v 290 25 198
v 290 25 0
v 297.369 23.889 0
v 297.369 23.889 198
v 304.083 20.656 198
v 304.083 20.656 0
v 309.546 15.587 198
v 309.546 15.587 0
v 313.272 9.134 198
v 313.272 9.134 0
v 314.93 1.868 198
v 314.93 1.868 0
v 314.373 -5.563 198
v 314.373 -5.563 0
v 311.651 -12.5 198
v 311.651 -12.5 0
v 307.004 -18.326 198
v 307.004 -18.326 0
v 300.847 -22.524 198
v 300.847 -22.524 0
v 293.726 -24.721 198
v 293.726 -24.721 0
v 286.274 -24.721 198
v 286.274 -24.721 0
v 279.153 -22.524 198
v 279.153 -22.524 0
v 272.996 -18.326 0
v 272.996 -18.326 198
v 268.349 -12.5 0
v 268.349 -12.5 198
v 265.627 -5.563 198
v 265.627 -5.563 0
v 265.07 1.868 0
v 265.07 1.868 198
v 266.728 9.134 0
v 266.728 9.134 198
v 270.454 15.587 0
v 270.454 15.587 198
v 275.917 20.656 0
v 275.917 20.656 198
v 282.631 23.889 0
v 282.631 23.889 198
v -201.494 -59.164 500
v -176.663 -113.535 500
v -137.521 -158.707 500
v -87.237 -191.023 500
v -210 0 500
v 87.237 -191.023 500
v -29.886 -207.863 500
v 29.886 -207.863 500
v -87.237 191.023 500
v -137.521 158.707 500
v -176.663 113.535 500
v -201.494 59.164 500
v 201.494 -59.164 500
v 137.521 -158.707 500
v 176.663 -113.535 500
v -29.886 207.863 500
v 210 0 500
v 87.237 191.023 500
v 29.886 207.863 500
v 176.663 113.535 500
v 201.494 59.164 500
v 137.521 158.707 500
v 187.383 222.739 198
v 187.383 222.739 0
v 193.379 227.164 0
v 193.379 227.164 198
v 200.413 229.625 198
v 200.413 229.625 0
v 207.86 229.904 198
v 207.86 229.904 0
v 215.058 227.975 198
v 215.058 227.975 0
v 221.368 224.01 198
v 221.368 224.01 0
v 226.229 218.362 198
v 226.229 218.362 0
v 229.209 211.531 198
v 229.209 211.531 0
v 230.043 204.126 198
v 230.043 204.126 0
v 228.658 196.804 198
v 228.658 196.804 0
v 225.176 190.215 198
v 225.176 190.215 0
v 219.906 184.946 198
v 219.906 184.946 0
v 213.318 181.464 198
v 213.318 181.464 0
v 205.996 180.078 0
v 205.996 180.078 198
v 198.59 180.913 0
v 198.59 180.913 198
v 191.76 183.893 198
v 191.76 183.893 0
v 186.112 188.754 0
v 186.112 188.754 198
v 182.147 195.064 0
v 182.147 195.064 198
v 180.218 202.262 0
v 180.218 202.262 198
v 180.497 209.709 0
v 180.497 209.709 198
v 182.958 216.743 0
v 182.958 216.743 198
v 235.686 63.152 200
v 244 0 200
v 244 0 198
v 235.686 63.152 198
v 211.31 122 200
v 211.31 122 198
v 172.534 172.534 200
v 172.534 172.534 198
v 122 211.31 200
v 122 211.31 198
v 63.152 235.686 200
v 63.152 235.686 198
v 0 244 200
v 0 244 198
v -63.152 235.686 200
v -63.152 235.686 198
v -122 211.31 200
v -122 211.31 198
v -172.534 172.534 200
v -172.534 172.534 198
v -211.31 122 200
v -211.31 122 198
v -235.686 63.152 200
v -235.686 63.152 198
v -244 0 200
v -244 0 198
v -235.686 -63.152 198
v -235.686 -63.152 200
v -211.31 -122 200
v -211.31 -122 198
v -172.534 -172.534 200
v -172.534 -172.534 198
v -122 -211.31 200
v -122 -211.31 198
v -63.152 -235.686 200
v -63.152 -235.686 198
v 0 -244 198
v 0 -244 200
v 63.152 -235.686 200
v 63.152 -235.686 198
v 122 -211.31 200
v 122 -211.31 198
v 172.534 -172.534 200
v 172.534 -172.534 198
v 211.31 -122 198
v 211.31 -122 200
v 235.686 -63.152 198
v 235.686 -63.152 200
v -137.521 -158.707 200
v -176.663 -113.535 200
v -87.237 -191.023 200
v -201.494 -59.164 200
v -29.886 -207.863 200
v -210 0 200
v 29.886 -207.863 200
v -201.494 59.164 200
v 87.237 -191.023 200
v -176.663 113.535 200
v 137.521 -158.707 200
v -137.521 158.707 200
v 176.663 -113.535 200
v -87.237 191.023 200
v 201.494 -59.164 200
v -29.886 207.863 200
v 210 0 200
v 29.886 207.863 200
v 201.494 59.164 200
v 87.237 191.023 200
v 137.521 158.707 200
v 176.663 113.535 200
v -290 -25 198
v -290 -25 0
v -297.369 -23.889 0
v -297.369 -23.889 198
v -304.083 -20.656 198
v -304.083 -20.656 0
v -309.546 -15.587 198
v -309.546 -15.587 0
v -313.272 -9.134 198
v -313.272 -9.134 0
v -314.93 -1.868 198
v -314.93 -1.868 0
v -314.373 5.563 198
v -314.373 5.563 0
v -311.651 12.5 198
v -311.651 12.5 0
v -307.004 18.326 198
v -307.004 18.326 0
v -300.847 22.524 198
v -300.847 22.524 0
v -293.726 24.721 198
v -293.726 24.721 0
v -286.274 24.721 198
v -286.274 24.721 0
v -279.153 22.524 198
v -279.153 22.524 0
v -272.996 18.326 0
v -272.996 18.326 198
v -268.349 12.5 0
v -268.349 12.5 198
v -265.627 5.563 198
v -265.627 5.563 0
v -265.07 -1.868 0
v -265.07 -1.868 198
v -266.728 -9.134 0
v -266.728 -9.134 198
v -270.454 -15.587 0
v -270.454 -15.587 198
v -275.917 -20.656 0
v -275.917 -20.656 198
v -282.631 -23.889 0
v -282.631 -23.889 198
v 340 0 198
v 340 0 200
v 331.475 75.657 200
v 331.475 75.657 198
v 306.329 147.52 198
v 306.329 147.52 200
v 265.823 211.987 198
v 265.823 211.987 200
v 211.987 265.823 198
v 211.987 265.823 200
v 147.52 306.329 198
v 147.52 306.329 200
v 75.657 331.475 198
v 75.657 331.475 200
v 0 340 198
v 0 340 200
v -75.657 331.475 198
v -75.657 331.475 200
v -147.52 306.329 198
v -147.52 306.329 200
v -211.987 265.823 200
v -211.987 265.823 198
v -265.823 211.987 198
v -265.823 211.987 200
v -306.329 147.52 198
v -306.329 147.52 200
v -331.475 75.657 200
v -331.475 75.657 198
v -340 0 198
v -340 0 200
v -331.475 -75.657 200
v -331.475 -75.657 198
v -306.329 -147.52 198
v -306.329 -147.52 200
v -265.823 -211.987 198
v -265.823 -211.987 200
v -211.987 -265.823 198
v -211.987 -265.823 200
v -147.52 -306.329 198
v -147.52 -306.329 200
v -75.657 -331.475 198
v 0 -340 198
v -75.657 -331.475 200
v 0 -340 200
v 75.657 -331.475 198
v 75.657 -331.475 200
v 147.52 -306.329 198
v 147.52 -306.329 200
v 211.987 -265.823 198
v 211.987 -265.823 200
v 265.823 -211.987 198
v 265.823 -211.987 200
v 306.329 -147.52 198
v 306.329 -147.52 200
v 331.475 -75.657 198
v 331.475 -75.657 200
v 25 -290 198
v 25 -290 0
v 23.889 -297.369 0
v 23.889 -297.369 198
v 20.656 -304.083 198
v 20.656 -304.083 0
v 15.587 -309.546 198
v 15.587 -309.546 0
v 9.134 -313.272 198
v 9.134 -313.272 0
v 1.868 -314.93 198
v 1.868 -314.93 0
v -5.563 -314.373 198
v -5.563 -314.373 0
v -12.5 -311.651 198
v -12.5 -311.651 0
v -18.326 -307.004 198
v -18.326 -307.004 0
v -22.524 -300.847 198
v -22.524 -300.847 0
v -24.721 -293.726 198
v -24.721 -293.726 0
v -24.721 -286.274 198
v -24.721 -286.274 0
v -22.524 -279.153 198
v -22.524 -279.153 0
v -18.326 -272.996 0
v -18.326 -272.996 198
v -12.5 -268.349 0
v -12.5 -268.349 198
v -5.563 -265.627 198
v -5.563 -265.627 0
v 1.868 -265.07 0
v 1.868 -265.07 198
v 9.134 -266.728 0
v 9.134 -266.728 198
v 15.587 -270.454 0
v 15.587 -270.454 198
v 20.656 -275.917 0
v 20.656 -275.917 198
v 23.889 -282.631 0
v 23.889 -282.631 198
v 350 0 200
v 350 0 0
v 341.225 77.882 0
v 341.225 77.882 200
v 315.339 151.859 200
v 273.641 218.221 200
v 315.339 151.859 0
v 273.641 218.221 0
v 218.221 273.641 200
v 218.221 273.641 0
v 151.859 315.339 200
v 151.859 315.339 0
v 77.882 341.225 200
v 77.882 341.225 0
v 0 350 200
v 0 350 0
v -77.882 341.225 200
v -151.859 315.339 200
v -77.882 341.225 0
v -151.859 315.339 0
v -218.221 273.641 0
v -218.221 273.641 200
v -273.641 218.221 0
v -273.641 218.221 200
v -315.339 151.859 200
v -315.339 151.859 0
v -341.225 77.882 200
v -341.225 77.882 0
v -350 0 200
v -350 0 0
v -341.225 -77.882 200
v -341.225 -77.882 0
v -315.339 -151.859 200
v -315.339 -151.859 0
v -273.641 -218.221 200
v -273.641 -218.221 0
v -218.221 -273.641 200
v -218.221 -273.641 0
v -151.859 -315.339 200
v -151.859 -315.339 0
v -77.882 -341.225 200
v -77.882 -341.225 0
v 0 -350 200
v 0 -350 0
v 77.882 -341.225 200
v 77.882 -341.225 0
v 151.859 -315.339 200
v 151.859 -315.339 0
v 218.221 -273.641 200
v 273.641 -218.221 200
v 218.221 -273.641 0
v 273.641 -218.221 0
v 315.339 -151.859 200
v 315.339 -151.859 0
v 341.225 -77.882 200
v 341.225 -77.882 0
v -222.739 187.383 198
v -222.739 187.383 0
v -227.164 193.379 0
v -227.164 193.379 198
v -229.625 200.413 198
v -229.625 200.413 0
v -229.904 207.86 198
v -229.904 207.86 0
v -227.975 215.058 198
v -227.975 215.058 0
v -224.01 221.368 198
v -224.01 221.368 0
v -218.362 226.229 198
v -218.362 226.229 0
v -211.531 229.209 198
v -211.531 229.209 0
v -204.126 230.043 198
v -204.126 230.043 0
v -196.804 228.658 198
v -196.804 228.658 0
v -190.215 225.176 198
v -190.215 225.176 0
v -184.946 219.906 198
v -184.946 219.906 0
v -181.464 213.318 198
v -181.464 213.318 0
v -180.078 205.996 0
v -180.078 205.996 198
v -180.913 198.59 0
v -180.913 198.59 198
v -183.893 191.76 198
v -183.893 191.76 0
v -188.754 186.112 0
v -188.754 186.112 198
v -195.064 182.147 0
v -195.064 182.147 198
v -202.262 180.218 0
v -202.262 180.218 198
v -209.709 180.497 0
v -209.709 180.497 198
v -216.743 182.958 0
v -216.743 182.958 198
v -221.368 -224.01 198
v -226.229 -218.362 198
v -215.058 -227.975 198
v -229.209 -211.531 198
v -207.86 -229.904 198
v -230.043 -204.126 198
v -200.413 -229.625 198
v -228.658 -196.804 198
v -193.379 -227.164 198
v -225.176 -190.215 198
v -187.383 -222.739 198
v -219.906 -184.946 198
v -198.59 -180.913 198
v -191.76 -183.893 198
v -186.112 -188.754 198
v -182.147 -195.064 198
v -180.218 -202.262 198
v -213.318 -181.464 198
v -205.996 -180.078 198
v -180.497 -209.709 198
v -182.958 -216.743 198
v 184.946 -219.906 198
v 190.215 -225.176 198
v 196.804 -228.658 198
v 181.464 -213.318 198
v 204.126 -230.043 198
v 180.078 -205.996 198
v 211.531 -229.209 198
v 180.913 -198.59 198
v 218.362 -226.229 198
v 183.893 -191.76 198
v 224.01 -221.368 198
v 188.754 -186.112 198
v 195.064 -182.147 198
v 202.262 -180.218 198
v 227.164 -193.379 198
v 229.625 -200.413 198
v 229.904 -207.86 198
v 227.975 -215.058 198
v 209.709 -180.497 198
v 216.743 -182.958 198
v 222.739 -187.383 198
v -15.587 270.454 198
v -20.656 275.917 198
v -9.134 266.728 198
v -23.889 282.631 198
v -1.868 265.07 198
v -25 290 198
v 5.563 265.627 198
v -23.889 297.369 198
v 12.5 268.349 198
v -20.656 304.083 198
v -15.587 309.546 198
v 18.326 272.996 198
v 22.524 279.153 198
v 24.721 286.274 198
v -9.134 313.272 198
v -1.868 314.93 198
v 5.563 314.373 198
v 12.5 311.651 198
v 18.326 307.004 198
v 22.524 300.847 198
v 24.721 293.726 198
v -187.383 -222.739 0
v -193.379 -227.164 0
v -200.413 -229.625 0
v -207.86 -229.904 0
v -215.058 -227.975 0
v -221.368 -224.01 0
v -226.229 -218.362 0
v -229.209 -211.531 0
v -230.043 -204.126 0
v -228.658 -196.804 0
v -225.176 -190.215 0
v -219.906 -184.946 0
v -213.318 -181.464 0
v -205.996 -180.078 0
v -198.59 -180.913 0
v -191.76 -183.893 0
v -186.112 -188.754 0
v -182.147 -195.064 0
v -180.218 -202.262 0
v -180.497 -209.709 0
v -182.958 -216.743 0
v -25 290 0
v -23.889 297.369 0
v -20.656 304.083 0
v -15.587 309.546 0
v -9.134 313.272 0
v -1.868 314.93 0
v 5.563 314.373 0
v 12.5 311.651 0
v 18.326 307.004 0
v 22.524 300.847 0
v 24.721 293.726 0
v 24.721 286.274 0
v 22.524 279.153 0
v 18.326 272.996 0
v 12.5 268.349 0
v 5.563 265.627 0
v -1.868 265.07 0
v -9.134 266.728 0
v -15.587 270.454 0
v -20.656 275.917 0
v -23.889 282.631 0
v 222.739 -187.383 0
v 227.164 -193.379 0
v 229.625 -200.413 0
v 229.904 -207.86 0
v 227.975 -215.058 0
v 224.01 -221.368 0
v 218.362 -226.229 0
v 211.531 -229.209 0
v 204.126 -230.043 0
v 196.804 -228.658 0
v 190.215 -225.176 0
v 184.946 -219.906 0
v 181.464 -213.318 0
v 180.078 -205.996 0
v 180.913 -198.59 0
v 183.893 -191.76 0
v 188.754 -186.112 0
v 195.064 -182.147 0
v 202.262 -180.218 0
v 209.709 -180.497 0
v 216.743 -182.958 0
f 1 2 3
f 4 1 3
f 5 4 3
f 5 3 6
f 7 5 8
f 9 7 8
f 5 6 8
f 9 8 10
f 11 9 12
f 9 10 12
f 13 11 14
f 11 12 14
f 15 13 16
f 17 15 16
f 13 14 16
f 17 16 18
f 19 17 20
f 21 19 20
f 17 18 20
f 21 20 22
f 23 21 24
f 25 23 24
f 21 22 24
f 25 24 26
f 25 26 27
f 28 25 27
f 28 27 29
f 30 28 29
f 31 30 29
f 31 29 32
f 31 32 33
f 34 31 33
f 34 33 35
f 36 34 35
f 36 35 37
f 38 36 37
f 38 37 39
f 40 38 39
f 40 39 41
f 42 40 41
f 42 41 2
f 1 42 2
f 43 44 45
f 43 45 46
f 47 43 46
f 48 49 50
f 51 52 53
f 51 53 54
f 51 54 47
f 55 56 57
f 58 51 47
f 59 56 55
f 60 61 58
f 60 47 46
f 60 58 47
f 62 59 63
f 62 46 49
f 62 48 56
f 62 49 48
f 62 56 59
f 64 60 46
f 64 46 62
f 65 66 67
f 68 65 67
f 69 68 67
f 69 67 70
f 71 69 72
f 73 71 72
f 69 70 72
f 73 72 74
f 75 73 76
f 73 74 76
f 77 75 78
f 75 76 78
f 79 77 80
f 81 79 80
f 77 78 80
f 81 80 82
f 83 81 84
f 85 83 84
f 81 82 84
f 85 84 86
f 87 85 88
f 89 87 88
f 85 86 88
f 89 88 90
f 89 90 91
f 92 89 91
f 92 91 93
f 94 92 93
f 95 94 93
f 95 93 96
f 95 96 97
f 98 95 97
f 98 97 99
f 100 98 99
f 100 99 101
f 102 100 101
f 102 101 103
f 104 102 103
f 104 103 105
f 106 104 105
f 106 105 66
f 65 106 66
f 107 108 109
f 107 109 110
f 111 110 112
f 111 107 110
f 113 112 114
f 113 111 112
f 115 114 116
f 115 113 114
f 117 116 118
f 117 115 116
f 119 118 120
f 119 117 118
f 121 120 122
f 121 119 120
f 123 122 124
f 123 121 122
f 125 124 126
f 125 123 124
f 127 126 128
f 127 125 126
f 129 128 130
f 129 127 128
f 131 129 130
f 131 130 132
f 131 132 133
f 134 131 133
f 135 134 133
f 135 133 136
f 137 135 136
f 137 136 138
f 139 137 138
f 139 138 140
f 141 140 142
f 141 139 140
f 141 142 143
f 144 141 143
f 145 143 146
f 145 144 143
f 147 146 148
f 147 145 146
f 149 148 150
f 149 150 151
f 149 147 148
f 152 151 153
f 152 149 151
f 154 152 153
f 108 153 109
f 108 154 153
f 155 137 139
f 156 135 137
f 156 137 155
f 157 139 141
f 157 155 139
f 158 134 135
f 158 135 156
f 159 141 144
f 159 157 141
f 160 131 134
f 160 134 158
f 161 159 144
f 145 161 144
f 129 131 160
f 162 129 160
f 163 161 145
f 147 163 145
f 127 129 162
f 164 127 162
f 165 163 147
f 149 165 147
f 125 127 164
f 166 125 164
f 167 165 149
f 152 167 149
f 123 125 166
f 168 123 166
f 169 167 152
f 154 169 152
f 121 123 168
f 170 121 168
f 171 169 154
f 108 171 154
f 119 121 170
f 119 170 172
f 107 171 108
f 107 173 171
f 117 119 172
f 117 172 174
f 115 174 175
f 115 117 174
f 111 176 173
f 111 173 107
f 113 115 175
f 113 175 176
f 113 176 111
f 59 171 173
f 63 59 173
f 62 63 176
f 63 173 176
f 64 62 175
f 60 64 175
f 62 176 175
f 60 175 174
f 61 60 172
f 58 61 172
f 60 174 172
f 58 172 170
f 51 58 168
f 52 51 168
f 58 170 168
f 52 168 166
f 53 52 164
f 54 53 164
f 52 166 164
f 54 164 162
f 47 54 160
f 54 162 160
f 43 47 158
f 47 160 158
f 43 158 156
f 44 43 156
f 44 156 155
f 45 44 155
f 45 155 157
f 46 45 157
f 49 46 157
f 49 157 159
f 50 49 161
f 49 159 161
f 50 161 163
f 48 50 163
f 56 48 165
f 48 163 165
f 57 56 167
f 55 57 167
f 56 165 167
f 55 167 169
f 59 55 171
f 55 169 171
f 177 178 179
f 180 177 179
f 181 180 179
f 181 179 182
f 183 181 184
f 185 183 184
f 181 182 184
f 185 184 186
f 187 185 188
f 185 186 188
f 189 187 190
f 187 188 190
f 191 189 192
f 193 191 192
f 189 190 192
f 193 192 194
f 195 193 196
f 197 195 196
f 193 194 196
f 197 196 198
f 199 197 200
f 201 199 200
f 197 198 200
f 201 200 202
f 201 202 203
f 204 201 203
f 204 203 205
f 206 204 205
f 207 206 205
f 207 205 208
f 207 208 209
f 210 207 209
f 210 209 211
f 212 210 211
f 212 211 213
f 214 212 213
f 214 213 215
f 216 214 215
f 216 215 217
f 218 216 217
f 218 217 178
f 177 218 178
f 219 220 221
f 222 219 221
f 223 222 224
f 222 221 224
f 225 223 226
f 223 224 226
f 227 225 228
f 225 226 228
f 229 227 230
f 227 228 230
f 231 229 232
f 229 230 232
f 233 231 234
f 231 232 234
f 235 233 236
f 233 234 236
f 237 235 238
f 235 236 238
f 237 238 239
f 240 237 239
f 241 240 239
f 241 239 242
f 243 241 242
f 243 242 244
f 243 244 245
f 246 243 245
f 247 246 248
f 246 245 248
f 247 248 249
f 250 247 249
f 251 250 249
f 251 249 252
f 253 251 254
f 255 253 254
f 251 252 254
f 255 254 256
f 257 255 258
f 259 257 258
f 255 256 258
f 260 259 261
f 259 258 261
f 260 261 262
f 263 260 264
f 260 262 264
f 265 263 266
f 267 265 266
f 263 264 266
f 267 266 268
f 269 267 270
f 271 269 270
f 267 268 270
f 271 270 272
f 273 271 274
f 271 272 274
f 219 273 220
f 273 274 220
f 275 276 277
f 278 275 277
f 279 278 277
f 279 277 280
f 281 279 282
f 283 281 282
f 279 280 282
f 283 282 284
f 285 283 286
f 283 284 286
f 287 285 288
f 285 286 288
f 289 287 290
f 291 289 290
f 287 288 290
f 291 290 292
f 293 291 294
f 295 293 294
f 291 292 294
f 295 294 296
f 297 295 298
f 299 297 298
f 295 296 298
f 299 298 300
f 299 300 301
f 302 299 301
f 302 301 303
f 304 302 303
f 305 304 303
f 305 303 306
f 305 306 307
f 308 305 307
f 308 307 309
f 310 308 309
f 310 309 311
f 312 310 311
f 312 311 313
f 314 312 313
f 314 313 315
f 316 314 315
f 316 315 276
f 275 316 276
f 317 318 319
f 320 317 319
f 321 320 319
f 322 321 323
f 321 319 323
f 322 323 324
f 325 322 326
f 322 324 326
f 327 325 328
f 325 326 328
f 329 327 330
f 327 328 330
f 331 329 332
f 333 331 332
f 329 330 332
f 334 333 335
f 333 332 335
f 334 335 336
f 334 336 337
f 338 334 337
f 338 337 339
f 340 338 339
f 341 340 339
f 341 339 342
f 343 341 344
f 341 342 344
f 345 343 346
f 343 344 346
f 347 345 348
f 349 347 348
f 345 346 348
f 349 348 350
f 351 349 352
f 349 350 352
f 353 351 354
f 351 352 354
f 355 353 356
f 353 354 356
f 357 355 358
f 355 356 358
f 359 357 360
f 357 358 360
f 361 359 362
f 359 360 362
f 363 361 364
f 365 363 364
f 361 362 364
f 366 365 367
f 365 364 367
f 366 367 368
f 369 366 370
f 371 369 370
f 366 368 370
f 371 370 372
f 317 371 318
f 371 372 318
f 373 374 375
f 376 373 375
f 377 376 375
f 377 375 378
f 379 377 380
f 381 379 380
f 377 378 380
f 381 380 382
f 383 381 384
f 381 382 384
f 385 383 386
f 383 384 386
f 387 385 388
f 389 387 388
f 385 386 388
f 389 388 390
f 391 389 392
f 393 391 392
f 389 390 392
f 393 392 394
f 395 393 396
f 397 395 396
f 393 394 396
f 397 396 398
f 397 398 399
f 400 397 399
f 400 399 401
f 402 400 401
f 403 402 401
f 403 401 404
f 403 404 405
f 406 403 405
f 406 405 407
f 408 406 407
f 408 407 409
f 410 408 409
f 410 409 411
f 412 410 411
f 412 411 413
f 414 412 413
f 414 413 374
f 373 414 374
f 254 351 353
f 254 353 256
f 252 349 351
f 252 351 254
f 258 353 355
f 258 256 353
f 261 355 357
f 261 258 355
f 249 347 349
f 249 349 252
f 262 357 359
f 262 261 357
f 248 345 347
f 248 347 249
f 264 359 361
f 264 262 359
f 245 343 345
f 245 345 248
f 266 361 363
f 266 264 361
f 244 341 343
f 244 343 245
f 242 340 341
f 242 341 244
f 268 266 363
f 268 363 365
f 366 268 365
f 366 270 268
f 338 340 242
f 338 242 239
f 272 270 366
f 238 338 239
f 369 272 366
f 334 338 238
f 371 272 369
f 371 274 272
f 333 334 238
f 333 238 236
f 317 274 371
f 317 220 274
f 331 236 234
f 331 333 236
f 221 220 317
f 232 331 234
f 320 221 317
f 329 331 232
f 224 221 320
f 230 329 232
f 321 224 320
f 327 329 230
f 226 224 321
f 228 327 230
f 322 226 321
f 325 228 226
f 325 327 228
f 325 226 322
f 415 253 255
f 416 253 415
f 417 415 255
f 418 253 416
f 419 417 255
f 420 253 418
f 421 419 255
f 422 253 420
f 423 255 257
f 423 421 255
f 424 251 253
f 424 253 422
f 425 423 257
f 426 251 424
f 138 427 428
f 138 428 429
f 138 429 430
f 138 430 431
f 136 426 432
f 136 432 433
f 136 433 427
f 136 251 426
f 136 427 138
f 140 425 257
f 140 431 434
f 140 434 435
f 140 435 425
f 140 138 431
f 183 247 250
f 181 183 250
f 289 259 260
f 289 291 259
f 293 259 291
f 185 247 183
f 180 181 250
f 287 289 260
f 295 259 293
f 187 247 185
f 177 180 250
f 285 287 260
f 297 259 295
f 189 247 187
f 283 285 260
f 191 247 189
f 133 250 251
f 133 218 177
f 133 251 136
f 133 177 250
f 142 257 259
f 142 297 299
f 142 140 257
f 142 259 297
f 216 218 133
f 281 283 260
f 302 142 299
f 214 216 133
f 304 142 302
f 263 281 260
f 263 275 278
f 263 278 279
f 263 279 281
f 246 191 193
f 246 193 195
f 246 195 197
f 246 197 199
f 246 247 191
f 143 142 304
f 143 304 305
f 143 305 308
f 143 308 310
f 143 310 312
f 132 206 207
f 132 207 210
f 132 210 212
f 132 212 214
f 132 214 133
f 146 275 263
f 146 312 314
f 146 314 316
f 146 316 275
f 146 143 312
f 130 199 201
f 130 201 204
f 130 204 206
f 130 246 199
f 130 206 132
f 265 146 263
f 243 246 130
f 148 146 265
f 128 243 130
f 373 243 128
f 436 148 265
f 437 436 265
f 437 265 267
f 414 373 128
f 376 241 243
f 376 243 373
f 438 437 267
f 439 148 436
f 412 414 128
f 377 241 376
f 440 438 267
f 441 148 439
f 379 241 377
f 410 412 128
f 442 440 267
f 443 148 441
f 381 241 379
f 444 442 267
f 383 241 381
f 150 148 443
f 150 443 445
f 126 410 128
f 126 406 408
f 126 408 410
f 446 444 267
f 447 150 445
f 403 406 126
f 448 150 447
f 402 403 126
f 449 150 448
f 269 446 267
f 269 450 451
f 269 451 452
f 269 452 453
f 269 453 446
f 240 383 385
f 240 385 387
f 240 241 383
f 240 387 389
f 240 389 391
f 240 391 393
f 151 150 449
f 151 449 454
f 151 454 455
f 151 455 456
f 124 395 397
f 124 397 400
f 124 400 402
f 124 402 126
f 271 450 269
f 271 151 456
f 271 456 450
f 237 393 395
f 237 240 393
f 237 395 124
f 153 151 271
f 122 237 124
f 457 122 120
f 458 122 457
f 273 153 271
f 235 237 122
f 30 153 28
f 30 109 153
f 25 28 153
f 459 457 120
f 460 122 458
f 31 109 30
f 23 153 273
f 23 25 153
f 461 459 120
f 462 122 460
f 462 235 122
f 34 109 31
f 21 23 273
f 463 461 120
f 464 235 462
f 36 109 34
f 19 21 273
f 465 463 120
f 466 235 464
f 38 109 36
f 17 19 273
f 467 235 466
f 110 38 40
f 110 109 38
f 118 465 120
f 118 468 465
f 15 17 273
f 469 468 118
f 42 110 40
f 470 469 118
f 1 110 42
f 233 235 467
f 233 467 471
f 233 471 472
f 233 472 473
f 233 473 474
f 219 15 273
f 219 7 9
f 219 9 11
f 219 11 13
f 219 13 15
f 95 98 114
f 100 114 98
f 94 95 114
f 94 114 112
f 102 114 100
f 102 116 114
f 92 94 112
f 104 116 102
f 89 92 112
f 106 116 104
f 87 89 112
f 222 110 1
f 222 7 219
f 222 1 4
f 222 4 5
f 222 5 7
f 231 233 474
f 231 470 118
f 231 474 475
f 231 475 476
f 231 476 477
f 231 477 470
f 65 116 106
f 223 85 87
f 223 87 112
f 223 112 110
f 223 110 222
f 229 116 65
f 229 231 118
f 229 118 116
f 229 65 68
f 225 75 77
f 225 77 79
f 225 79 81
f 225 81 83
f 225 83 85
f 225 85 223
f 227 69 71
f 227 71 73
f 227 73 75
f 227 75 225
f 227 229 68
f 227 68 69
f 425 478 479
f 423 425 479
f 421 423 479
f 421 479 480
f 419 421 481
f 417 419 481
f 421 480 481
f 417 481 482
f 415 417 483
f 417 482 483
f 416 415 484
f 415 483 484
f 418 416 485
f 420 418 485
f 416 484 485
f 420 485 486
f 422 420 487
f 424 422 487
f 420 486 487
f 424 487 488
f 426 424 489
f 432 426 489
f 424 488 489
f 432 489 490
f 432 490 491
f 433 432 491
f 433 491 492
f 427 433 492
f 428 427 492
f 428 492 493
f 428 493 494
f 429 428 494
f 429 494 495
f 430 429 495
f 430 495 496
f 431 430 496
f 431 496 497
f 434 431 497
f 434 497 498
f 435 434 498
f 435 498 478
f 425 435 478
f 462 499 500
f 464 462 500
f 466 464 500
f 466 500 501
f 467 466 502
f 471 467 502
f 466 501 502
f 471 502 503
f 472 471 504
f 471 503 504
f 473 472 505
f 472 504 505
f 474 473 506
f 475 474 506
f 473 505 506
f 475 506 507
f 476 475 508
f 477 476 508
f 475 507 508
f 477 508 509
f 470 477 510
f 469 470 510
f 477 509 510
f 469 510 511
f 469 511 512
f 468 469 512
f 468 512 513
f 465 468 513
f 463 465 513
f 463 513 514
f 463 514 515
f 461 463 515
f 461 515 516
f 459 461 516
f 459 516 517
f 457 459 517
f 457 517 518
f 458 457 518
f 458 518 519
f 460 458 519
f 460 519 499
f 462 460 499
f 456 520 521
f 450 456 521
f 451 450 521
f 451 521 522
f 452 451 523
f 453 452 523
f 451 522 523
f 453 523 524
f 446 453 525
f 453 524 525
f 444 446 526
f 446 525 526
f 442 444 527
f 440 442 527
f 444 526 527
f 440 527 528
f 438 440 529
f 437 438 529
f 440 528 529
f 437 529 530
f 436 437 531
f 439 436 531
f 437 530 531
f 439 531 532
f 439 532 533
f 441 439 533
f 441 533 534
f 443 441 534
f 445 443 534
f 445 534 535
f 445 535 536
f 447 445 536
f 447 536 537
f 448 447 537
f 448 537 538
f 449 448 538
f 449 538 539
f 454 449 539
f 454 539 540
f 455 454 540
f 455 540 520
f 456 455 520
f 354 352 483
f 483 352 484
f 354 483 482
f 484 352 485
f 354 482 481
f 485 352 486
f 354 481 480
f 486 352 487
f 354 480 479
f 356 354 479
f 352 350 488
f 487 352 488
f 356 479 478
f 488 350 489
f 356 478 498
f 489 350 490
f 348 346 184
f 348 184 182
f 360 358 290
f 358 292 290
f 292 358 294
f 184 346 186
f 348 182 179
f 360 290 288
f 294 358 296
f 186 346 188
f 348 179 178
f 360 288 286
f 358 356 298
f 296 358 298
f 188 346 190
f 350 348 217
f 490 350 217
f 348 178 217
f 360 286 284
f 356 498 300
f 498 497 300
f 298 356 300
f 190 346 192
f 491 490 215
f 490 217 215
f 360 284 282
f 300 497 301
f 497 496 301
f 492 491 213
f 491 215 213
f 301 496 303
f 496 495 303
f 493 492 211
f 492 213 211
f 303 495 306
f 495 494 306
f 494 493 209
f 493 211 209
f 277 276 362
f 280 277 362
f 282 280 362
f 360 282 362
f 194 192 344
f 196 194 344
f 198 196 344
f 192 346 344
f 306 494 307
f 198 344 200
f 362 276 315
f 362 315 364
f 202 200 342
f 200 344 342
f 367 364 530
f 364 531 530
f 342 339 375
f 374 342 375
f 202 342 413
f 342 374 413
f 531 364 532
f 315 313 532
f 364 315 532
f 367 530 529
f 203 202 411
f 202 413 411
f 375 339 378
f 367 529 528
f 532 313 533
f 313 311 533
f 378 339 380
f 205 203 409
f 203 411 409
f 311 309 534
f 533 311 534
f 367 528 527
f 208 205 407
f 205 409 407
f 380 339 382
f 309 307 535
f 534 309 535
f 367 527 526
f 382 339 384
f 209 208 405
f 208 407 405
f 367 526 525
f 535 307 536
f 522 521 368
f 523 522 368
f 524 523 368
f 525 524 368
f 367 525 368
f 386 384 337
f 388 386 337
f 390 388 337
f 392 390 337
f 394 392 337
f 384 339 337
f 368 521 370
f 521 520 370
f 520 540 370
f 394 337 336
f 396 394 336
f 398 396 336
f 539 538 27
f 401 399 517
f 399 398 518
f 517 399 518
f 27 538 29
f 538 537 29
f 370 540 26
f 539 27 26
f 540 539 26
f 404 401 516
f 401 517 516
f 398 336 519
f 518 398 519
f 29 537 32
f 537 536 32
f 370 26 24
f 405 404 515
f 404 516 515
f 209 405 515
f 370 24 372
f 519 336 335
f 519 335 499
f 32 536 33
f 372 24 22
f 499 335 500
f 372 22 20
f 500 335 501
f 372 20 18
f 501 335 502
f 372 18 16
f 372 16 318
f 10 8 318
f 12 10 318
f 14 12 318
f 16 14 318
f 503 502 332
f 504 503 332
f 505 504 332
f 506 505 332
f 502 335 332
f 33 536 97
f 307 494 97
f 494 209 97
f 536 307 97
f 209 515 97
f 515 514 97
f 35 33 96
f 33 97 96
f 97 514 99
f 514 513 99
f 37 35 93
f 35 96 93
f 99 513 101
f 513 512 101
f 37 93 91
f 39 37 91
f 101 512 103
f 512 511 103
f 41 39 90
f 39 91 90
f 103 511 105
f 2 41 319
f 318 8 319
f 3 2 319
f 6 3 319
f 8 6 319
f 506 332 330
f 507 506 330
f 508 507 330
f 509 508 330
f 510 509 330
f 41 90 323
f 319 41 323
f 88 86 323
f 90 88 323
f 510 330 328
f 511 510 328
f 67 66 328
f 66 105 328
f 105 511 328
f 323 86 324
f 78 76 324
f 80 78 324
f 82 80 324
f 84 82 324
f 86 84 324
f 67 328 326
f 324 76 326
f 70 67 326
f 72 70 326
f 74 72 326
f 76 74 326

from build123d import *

# Parameters (mm, degrees)
SKETCH_1_R               = 350
EXTRUDE_1_DEPTH          = 200
SKETCH_2_R               = 210
EXTRUDE_2_DEPTH          = 300
SKETCH_3_R               = 340
SKETCH_3_R_2             = 244
CUT_EXTRUDE_1_DEPTH      = 2
SKETCH_4_R               = 25
CUT_EXTRUDE_2_DEPTH      = 704.562363974
PATTERN_CIRCULAR_1_COUNT = 8


with BuildPart() as part:
    # 草图1 → 凸台-拉伸1 (new body)
    with BuildSketch(Plane.XY):
        Circle(SKETCH_1_R)
    extrude(amount=EXTRUDE_1_DEPTH)

    # 草图2 → 凸台-拉伸2 (add)
    with BuildSketch(Plane.XY.offset(200)):
        Circle(SKETCH_2_R)
    extrude(amount=EXTRUDE_2_DEPTH)

    # 草图3 → 切除-拉伸1 (cut)
    with BuildSketch(Plane.XY.offset(200)):
        Circle(SKETCH_3_R)
        Circle(SKETCH_3_R_2, mode=Mode.SUBTRACT)
    extrude(amount=-CUT_EXTRUDE_1_DEPTH, mode=Mode.SUBTRACT)

    # 草图4 → 切除-拉伸2 (cut, through all)
    with BuildSketch(Plane(origin=(0, 0, 0), x_dir=(-1, 0, 0), z_dir=(0, 0, -1))):
        with Locations((0, 290)):
            Circle(SKETCH_4_R)
    cut_extrude_2 = extrude(amount=-CUT_EXTRUDE_2_DEPTH, mode=Mode.SUBTRACT)

    # 阵列(圆周)1: 切除-拉伸2 ×8 about axis
    pattern_circular_1_axis = Axis((0, 0, 0), (0, 0, 1))
    for i in range(1, PATTERN_CIRCULAR_1_COUNT):
        add(cut_extrude_2.rotate(pattern_circular_1_axis, i * 360 / PATTERN_CIRCULAR_1_COUNT), mode=Mode.SUBTRACT)


solid = part.part
